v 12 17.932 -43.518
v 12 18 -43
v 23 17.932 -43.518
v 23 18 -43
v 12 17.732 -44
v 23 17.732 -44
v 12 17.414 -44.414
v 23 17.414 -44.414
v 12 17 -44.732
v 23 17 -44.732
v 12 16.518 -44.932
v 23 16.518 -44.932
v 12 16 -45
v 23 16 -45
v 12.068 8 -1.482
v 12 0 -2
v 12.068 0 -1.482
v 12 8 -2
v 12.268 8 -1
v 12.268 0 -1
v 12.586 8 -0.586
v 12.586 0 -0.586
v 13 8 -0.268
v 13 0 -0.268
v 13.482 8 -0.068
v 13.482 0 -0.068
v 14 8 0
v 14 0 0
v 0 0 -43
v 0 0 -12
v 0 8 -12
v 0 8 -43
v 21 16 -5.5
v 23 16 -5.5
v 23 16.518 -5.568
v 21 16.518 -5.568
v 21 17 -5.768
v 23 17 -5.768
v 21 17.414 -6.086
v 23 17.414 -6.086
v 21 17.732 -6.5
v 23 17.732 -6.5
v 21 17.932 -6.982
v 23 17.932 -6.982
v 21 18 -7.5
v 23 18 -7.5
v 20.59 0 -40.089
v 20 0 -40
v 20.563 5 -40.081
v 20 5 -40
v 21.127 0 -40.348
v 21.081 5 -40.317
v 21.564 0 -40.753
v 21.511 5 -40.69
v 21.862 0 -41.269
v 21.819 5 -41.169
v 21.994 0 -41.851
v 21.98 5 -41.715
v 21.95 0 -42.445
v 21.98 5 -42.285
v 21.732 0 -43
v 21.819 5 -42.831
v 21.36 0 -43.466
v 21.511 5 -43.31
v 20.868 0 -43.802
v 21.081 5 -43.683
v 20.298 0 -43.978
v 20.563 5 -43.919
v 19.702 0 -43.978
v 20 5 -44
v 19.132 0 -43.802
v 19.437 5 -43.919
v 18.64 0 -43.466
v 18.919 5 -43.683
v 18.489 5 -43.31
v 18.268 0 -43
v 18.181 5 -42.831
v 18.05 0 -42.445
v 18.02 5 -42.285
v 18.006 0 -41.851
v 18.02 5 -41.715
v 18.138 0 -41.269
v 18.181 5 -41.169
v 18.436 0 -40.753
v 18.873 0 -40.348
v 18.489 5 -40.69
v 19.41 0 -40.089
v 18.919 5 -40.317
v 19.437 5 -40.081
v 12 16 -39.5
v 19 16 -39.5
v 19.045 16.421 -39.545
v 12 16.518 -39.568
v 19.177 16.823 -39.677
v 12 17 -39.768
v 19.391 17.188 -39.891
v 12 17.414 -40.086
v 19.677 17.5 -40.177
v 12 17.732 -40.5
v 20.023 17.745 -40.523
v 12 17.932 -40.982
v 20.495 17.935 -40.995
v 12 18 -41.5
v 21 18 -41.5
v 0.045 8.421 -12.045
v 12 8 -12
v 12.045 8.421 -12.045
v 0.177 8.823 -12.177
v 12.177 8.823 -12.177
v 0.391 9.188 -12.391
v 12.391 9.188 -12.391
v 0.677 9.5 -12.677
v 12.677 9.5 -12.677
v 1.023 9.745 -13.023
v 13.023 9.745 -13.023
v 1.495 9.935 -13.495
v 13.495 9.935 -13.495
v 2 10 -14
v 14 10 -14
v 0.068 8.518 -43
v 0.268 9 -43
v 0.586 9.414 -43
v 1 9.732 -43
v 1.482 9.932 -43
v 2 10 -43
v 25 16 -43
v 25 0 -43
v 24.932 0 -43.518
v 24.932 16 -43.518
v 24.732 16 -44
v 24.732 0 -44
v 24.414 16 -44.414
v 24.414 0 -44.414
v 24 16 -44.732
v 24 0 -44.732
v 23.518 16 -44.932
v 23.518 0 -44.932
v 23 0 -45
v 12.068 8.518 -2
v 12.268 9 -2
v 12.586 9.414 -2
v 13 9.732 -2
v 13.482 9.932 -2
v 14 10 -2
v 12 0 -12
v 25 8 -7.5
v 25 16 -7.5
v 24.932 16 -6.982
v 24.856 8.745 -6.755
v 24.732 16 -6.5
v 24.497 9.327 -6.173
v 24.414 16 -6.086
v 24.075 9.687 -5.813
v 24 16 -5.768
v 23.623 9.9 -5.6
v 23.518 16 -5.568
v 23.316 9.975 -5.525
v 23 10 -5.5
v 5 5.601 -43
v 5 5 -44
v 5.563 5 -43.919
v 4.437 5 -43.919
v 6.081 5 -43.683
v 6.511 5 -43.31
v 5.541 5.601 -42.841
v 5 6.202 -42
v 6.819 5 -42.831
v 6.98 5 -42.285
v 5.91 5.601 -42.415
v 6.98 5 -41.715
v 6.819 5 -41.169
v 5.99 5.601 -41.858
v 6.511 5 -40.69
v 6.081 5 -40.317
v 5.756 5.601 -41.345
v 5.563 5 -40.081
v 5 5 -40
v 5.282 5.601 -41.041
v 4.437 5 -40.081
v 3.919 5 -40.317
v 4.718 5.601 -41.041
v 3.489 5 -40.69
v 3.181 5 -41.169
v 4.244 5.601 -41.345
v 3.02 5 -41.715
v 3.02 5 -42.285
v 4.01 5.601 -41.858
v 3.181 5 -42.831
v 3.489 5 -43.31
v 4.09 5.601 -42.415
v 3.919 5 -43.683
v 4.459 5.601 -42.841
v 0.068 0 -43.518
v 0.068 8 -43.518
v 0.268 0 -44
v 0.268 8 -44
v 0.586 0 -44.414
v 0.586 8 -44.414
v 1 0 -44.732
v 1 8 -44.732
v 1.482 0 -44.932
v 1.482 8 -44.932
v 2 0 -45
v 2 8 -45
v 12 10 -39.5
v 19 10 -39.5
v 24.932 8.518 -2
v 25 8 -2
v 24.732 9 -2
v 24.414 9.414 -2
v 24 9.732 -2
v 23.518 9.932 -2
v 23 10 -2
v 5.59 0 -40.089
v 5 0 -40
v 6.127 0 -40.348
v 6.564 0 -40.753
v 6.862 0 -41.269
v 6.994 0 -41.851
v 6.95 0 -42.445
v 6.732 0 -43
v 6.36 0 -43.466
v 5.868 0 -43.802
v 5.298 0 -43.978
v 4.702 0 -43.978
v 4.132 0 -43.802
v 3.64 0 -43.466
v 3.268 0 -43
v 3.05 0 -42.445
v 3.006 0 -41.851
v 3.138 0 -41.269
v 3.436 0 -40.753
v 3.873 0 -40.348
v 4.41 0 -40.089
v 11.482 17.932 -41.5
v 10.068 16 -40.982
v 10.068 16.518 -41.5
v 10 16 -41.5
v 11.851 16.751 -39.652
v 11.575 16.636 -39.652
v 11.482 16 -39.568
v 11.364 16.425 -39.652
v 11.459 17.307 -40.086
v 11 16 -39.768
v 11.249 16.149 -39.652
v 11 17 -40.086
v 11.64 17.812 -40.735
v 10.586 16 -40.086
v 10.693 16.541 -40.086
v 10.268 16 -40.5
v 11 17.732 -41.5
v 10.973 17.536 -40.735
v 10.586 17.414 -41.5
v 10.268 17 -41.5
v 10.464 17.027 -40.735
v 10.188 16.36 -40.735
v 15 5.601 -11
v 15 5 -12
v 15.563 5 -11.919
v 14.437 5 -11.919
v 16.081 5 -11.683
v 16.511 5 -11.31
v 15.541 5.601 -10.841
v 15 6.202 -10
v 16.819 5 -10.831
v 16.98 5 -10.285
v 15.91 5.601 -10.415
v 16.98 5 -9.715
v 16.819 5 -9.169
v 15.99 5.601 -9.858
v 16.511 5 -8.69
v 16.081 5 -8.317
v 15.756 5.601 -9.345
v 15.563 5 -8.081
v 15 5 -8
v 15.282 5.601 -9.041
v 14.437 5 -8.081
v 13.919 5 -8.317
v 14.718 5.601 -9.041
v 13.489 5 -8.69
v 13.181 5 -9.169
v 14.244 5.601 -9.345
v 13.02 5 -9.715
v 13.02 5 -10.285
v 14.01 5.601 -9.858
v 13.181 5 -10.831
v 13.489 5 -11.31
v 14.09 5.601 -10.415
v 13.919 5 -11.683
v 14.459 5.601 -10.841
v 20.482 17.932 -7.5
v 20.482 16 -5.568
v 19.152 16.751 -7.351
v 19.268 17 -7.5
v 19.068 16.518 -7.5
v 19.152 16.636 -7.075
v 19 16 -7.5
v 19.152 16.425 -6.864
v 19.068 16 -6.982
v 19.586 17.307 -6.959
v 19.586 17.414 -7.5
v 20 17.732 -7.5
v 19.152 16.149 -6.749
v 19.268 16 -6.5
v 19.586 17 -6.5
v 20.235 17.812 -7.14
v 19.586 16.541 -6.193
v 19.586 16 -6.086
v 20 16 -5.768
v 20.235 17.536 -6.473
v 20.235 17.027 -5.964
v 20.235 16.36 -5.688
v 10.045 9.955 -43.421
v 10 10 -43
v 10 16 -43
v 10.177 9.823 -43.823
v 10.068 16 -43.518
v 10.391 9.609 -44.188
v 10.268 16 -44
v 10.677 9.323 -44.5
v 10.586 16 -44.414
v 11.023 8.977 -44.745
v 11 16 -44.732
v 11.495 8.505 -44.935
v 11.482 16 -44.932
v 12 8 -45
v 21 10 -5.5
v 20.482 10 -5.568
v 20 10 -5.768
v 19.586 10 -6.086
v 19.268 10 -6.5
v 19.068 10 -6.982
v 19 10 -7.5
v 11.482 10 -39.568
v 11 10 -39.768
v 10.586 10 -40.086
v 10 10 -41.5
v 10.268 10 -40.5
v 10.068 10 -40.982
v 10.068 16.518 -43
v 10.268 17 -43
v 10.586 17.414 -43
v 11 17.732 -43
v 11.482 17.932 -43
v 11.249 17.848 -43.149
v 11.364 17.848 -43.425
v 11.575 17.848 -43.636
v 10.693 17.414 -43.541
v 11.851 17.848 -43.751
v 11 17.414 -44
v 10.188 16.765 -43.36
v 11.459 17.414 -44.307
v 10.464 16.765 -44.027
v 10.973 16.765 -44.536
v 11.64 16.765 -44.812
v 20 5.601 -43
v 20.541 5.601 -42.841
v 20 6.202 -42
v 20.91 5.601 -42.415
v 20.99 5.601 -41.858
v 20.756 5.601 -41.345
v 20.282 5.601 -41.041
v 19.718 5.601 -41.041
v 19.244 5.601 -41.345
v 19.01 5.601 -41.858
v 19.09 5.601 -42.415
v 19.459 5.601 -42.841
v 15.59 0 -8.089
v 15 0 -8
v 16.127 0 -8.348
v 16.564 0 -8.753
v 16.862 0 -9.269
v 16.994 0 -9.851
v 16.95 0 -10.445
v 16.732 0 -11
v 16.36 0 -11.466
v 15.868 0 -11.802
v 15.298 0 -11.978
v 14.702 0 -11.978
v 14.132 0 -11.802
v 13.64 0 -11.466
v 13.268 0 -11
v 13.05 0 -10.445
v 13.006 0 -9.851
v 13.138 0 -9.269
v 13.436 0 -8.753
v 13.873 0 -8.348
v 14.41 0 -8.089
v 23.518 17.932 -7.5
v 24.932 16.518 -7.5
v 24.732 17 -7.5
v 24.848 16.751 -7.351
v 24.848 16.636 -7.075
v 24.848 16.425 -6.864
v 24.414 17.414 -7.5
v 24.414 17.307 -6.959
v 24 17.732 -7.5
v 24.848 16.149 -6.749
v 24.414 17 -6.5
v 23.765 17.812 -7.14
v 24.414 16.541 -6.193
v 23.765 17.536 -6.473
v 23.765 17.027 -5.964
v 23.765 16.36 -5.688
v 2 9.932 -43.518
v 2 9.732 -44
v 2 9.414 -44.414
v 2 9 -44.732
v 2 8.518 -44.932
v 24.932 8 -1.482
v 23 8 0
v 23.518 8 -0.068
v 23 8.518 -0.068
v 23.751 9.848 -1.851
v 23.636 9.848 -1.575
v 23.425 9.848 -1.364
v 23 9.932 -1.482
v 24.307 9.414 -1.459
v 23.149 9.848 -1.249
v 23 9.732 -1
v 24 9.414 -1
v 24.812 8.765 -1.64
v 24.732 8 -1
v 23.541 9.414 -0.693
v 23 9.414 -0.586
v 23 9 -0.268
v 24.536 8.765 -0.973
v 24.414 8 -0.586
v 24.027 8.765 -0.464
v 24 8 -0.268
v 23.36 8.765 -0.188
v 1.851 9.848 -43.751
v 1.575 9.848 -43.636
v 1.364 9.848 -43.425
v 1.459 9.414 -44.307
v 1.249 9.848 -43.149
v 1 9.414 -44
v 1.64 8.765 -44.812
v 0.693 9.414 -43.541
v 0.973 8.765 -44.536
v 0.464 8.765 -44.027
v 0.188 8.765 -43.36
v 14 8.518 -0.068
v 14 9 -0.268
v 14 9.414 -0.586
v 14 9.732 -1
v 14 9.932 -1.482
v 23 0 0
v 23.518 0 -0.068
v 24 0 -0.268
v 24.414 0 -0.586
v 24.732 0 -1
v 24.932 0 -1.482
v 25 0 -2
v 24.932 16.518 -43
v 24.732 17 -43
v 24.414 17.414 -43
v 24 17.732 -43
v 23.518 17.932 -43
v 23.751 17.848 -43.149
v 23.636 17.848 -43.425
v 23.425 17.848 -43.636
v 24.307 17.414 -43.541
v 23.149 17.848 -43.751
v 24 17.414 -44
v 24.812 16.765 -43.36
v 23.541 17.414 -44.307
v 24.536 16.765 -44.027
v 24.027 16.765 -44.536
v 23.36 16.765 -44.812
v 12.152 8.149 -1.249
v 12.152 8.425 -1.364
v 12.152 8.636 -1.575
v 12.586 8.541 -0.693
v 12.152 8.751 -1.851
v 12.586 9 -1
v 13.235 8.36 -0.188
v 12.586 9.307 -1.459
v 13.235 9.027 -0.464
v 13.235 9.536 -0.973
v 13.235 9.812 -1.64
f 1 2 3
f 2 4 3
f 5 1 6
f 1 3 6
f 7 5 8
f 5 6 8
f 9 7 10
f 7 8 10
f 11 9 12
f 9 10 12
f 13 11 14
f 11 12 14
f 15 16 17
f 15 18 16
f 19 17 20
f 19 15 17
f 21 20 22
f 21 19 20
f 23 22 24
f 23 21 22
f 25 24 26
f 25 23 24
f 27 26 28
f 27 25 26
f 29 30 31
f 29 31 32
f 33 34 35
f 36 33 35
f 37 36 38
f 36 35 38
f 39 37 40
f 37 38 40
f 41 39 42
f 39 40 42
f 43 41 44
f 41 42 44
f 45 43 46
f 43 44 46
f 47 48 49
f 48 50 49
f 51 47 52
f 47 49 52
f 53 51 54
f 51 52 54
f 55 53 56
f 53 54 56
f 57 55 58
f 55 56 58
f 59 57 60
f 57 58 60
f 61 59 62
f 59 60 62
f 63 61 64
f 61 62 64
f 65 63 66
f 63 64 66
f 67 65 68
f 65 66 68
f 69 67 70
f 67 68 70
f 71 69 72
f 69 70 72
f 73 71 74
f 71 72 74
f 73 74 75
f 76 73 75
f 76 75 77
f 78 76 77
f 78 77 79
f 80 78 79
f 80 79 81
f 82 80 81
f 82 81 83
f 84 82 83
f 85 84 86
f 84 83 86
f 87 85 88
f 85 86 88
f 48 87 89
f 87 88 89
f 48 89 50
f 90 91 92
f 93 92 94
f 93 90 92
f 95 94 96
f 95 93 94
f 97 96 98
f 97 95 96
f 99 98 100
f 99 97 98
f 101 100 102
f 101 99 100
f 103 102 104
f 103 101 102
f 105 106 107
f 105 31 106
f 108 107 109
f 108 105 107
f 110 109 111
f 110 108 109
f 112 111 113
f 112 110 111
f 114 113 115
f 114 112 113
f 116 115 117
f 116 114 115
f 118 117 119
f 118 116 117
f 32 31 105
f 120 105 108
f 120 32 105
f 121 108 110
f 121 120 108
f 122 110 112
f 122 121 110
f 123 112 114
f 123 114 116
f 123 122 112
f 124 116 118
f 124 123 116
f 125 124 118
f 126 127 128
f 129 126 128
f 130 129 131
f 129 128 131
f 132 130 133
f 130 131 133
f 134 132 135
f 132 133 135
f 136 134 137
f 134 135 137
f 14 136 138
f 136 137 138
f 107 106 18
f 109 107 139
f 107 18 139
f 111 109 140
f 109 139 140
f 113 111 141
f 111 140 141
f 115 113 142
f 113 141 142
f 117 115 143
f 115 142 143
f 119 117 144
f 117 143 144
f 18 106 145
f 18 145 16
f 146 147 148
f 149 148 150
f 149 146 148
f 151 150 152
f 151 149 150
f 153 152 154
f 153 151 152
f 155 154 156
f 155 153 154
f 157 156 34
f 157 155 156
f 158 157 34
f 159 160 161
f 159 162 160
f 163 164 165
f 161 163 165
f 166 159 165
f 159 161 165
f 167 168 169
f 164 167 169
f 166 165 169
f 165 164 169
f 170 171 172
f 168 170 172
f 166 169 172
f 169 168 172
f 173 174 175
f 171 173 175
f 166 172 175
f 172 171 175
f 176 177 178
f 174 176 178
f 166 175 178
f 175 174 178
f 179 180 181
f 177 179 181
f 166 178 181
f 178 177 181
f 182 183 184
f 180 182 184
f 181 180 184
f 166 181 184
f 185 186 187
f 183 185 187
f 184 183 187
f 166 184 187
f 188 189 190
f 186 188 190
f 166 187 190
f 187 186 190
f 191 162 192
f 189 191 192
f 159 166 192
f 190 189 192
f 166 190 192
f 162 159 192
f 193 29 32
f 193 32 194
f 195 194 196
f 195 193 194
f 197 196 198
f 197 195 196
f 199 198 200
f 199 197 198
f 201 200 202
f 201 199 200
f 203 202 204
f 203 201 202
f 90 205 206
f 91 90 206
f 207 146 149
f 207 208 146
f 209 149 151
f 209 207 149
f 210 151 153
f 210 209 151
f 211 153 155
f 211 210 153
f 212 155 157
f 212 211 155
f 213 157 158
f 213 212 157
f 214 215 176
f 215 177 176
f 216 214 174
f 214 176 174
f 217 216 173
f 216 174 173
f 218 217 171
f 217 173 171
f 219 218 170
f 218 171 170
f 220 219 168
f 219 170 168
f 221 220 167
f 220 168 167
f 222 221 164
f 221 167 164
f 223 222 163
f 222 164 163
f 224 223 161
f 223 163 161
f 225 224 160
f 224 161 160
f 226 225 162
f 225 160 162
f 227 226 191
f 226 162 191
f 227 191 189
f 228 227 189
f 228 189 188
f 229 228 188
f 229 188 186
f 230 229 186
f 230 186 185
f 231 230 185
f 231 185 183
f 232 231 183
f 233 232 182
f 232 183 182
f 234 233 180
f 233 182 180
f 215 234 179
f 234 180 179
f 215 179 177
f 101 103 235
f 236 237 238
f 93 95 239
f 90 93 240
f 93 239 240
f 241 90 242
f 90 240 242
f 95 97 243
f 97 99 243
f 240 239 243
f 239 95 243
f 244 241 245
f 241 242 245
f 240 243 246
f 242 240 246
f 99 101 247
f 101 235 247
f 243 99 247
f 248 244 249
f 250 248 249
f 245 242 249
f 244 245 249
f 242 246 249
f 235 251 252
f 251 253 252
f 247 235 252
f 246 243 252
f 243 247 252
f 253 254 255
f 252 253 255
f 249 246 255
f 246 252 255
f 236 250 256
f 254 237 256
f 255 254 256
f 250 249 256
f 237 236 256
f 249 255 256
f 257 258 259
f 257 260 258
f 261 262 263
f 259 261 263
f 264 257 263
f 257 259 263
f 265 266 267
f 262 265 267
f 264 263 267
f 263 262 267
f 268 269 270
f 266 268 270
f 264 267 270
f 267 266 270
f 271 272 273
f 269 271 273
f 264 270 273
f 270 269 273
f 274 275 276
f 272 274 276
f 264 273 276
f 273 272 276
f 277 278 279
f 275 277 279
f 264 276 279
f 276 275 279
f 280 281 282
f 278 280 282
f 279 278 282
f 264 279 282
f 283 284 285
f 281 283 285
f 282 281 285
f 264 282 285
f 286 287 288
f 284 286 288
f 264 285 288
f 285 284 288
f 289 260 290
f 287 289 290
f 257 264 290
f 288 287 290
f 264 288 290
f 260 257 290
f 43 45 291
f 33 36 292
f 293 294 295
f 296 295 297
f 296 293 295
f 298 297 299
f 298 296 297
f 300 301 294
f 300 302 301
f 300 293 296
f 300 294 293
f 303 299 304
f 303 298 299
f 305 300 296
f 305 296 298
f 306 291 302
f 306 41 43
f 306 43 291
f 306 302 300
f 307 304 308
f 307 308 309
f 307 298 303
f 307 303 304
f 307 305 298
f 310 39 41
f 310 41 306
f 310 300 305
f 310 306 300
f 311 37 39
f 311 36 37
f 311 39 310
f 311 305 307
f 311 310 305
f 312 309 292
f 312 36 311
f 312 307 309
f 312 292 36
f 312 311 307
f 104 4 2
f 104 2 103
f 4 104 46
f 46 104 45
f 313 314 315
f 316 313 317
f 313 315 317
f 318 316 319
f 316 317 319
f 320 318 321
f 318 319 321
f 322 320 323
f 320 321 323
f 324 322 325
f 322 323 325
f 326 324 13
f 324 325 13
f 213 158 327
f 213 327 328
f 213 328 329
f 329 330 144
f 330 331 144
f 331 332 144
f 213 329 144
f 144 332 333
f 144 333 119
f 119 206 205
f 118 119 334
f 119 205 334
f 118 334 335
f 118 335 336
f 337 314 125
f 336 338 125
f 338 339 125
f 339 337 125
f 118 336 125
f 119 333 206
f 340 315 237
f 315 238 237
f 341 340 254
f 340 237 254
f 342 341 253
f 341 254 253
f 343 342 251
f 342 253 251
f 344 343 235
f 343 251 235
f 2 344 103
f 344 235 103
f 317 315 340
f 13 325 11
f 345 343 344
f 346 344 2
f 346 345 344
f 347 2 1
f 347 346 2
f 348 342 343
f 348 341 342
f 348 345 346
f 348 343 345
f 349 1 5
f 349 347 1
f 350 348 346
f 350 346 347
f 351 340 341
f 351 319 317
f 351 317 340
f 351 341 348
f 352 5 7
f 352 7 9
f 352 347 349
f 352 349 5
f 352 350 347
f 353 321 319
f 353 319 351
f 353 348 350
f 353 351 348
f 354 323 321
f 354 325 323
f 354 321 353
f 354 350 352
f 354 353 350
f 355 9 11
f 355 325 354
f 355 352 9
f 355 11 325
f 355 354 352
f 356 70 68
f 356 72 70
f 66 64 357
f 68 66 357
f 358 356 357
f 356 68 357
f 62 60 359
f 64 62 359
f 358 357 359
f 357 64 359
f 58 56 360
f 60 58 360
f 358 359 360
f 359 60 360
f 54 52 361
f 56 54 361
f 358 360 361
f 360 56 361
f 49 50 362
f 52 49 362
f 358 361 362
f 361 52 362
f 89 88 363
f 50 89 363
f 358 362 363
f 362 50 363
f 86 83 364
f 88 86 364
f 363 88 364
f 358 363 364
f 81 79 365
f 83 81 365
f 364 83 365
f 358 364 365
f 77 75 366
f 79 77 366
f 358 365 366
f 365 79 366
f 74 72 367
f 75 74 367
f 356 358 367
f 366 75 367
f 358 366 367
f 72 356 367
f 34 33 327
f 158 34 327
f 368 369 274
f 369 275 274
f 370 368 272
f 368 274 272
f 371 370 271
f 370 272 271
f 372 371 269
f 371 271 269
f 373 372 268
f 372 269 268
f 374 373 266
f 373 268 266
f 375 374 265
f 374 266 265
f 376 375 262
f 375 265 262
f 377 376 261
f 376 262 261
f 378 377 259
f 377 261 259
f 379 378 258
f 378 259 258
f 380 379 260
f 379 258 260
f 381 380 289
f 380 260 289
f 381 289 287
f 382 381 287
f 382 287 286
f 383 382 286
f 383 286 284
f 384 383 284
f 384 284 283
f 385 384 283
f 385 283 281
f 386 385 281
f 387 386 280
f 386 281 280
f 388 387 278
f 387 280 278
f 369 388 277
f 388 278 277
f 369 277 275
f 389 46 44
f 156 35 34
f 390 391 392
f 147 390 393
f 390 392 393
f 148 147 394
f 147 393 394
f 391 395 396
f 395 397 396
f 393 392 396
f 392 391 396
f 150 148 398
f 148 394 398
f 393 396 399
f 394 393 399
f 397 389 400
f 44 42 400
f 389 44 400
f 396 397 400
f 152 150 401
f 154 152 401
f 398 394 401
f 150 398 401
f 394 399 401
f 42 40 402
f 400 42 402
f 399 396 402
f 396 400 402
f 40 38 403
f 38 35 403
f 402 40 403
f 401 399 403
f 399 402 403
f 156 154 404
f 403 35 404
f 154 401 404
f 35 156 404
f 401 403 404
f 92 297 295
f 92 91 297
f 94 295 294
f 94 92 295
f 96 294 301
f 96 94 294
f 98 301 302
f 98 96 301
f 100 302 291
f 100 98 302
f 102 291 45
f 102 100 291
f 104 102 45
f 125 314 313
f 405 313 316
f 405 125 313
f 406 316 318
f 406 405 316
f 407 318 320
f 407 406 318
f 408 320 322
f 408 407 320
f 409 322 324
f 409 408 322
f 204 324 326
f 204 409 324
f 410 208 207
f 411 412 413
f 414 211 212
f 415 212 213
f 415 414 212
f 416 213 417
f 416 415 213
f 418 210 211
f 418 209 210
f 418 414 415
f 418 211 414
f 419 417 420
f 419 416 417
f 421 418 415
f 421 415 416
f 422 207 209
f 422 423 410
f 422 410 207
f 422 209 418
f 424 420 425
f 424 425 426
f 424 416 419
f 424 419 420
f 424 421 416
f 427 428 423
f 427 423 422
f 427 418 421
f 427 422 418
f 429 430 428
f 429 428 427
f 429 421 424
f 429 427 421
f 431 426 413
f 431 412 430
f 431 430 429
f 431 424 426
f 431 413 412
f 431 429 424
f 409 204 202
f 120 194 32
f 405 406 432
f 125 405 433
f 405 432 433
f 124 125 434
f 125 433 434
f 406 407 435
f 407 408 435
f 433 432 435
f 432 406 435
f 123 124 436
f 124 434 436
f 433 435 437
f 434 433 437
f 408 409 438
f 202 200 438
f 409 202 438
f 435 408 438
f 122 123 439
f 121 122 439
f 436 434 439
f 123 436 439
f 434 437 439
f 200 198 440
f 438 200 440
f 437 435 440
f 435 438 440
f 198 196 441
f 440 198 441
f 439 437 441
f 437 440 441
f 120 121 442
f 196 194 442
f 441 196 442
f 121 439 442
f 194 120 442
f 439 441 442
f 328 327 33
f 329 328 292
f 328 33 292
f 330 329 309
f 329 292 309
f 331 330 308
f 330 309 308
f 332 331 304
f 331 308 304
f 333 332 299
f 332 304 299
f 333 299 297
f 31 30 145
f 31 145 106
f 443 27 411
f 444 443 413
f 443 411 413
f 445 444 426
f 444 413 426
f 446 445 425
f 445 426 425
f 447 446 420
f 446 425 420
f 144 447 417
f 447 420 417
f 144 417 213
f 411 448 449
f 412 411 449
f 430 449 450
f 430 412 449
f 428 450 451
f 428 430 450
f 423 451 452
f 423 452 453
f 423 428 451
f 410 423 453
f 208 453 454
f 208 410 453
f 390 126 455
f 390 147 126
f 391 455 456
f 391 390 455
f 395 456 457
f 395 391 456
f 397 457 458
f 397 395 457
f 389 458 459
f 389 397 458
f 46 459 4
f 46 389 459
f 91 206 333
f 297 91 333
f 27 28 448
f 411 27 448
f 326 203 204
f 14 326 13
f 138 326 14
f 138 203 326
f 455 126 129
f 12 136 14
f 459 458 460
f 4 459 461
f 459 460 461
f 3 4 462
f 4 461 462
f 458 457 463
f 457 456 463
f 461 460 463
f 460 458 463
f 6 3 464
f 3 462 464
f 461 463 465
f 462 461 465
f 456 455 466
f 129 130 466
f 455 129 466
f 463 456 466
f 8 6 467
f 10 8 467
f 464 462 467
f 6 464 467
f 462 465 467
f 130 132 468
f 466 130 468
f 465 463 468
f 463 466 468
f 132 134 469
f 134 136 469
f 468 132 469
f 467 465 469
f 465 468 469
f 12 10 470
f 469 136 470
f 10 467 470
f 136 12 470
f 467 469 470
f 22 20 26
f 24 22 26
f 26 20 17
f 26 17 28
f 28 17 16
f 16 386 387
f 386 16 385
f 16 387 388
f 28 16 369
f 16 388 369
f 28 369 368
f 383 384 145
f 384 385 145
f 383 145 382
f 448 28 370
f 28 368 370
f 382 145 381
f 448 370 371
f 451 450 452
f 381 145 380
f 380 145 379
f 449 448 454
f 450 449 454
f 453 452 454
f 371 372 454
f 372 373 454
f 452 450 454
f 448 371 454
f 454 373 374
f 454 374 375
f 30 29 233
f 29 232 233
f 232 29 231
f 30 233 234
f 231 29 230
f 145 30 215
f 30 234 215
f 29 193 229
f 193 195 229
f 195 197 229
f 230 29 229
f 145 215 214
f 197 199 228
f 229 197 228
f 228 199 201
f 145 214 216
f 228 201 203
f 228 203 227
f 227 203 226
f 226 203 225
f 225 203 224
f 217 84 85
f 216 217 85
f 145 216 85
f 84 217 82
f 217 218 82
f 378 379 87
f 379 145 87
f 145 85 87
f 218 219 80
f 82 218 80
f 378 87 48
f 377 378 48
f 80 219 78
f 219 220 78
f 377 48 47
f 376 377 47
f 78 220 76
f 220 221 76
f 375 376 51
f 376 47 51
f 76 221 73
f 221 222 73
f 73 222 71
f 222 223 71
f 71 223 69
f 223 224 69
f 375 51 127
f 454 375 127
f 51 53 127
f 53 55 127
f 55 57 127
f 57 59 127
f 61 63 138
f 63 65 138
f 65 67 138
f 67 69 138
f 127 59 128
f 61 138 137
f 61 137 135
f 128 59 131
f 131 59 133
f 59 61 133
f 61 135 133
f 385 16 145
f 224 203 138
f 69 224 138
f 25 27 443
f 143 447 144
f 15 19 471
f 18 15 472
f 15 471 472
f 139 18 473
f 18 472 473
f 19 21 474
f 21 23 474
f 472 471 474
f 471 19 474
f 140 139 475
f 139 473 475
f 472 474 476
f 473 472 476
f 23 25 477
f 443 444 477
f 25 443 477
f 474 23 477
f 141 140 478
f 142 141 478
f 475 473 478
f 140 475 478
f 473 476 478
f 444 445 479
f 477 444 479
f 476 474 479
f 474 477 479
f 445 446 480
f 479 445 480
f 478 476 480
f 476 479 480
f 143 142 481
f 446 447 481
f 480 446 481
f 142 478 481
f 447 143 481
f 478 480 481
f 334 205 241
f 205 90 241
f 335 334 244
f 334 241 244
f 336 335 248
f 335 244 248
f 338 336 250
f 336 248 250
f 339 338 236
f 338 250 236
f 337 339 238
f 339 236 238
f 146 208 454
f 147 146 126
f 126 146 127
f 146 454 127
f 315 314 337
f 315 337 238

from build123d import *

# Parameters (mm, degrees)
ESBO_O1_W                      = 25
ESBO_O1_H                      = 45
RESSALTO_EXTRUS_O1_DEPTH       = 10
RESSALTO_EXTRUS_O2_DEPTH       = 28
ESBO_O3_W                      = 25
ESBO_O3_H                      = 45
RESSALTO_EXTRUS_O3_DEPTH       = 6
FURO_DE_DI_METRO_4_0_4_1_D     = 4
FURO_DE_DI_METRO_4_0_4_1_DEPTH = 5
FURO_DE_DI_METRO_4_0_4_1_TIP   = 1.201721238
ESBO_O7_W                      = 10
ESBO_O7_H                      = 28
CORTE_EXTRUS_O2_DEPTH          = 5.5
ESBO_O8_W                      = 12
ESBO_O8_H                      = 12
CORTE_EXTRUS_O3_DEPTH          = 12
CORTE_EXTRUS_O4_DEPTH          = 68.720011813
FILETE2_R                      = 2


with BuildPart() as part:
    # Esboço1 → Ressalto-extrusão1 (new body)
    with BuildSketch(Plane(origin=(0, 0, 0), x_dir=(1, 0, 0), z_dir=(0, 1, 0))):
        with Locations((12.5, 22.5)):
            Rectangle(ESBO_O1_W, ESBO_O1_H)
    extrude(amount=RESSALTO_EXTRUS_O1_DEPTH)

    # Esboço2 → Ressalto-extrusão2 (add)
    with BuildSketch(Plane(origin=(0, 10, 0), x_dir=(1, 0, 0), z_dir=(0, 1, 0))):
        Polygon((0, 39.5), (19, 39.5), (19, 5.5), (0, 5.5), (0, 0), (25, 0), (25, 39.5), (25, 45), (0, 45), align=None)
    extrude(amount=RESSALTO_EXTRUS_O2_DEPTH)

    # Esboço3 → Ressalto-extrusão3 (add)
    with BuildSketch(Plane(origin=(0, 38, 0), x_dir=(1, 0, 0), z_dir=(0, 1, 0))):
        with Locations((12.5, 22.5)):
            Rectangle(ESBO_O3_W, ESBO_O3_H)
    extrude(amount=RESSALTO_EXTRUS_O3_DEPTH)

    # Furo de diâmetro Ø4.0 (4)1
    with Locations(Plane(origin=(15, 0, -10), x_dir=(0, 0, -1), z_dir=(0, -1, 0))):
        with Locations((0, 0), (32, 5), (32, -10)):
            Hole(FURO_DE_DI_METRO_4_0_4_1_D / 2, depth=FURO_DE_DI_METRO_4_0_4_1_DEPTH)
            with Locations((0, 0, -(FURO_DE_DI_METRO_4_0_4_1_DEPTH + FURO_DE_DI_METRO_4_0_4_1_TIP / 2))):  # 118° drill point
                Cone(0, FURO_DE_DI_METRO_4_0_4_1_D / 2, FURO_DE_DI_METRO_4_0_4_1_TIP, mode=Mode.SUBTRACT)

    # Esboço7 → Corte-extrusão2 (cut)
    with BuildSketch(Plane(origin=(0, 0, -45), x_dir=(-1, 0, 0), z_dir=(0, 0, -1))):
        with Locations((-5, 24)):
            Rectangle(ESBO_O7_W, ESBO_O7_H)
    extrude(amount=-CORTE_EXTRUS_O2_DEPTH, mode=Mode.SUBTRACT)

    # Esboço8 → Corte-extrusão3 (cut)
    with BuildSketch(Plane.ZY):
        with Locations((-6, 6)):
            Rectangle(ESBO_O8_W, ESBO_O8_H)
    extrude(amount=-CORTE_EXTRUS_O3_DEPTH, mode=Mode.SUBTRACT)

    # Esboço9 → Corte-extrusão4 (cut, through all)
    with BuildSketch(Plane.ZY):
        Polygon((-45, 44), (-45, 18), (-5.5, 18), (-5.5, 10), (0, 10), (0, 44), align=None)
    extrude(amount=-CORTE_EXTRUS_O4_DEPTH, mode=Mode.SUBTRACT)

    # Filete2
    filete2_edges = [part.edges().sort_by_distance(p)[0] for p in [
        (10, 14, -45),
        (10, 18, -42.25),
        (25, 9, -45),
        (25, 5, 0),
        (22, 18, -5.5),
        (19, 18, -22.5),
        (14.5, 18, -39.5),
        (25, 18, -25.25),
        (19, 14, -5.5),
        (25, 14, -5.5),
        (25, 10, -2.75),
        (18.5, 10, 0),
        (17.5, 18, -45),
        (0, 5, -45),
        (5, 10, -45),
        (10, 14, -39.5),
        (0, 10, -28.5),
        (6, 10, -12),
        (12, 5, 0),
        (12, 10, -6),
    ]]
    fillet(filete2_edges, radius=FILETE2_R)


solid = part.part
